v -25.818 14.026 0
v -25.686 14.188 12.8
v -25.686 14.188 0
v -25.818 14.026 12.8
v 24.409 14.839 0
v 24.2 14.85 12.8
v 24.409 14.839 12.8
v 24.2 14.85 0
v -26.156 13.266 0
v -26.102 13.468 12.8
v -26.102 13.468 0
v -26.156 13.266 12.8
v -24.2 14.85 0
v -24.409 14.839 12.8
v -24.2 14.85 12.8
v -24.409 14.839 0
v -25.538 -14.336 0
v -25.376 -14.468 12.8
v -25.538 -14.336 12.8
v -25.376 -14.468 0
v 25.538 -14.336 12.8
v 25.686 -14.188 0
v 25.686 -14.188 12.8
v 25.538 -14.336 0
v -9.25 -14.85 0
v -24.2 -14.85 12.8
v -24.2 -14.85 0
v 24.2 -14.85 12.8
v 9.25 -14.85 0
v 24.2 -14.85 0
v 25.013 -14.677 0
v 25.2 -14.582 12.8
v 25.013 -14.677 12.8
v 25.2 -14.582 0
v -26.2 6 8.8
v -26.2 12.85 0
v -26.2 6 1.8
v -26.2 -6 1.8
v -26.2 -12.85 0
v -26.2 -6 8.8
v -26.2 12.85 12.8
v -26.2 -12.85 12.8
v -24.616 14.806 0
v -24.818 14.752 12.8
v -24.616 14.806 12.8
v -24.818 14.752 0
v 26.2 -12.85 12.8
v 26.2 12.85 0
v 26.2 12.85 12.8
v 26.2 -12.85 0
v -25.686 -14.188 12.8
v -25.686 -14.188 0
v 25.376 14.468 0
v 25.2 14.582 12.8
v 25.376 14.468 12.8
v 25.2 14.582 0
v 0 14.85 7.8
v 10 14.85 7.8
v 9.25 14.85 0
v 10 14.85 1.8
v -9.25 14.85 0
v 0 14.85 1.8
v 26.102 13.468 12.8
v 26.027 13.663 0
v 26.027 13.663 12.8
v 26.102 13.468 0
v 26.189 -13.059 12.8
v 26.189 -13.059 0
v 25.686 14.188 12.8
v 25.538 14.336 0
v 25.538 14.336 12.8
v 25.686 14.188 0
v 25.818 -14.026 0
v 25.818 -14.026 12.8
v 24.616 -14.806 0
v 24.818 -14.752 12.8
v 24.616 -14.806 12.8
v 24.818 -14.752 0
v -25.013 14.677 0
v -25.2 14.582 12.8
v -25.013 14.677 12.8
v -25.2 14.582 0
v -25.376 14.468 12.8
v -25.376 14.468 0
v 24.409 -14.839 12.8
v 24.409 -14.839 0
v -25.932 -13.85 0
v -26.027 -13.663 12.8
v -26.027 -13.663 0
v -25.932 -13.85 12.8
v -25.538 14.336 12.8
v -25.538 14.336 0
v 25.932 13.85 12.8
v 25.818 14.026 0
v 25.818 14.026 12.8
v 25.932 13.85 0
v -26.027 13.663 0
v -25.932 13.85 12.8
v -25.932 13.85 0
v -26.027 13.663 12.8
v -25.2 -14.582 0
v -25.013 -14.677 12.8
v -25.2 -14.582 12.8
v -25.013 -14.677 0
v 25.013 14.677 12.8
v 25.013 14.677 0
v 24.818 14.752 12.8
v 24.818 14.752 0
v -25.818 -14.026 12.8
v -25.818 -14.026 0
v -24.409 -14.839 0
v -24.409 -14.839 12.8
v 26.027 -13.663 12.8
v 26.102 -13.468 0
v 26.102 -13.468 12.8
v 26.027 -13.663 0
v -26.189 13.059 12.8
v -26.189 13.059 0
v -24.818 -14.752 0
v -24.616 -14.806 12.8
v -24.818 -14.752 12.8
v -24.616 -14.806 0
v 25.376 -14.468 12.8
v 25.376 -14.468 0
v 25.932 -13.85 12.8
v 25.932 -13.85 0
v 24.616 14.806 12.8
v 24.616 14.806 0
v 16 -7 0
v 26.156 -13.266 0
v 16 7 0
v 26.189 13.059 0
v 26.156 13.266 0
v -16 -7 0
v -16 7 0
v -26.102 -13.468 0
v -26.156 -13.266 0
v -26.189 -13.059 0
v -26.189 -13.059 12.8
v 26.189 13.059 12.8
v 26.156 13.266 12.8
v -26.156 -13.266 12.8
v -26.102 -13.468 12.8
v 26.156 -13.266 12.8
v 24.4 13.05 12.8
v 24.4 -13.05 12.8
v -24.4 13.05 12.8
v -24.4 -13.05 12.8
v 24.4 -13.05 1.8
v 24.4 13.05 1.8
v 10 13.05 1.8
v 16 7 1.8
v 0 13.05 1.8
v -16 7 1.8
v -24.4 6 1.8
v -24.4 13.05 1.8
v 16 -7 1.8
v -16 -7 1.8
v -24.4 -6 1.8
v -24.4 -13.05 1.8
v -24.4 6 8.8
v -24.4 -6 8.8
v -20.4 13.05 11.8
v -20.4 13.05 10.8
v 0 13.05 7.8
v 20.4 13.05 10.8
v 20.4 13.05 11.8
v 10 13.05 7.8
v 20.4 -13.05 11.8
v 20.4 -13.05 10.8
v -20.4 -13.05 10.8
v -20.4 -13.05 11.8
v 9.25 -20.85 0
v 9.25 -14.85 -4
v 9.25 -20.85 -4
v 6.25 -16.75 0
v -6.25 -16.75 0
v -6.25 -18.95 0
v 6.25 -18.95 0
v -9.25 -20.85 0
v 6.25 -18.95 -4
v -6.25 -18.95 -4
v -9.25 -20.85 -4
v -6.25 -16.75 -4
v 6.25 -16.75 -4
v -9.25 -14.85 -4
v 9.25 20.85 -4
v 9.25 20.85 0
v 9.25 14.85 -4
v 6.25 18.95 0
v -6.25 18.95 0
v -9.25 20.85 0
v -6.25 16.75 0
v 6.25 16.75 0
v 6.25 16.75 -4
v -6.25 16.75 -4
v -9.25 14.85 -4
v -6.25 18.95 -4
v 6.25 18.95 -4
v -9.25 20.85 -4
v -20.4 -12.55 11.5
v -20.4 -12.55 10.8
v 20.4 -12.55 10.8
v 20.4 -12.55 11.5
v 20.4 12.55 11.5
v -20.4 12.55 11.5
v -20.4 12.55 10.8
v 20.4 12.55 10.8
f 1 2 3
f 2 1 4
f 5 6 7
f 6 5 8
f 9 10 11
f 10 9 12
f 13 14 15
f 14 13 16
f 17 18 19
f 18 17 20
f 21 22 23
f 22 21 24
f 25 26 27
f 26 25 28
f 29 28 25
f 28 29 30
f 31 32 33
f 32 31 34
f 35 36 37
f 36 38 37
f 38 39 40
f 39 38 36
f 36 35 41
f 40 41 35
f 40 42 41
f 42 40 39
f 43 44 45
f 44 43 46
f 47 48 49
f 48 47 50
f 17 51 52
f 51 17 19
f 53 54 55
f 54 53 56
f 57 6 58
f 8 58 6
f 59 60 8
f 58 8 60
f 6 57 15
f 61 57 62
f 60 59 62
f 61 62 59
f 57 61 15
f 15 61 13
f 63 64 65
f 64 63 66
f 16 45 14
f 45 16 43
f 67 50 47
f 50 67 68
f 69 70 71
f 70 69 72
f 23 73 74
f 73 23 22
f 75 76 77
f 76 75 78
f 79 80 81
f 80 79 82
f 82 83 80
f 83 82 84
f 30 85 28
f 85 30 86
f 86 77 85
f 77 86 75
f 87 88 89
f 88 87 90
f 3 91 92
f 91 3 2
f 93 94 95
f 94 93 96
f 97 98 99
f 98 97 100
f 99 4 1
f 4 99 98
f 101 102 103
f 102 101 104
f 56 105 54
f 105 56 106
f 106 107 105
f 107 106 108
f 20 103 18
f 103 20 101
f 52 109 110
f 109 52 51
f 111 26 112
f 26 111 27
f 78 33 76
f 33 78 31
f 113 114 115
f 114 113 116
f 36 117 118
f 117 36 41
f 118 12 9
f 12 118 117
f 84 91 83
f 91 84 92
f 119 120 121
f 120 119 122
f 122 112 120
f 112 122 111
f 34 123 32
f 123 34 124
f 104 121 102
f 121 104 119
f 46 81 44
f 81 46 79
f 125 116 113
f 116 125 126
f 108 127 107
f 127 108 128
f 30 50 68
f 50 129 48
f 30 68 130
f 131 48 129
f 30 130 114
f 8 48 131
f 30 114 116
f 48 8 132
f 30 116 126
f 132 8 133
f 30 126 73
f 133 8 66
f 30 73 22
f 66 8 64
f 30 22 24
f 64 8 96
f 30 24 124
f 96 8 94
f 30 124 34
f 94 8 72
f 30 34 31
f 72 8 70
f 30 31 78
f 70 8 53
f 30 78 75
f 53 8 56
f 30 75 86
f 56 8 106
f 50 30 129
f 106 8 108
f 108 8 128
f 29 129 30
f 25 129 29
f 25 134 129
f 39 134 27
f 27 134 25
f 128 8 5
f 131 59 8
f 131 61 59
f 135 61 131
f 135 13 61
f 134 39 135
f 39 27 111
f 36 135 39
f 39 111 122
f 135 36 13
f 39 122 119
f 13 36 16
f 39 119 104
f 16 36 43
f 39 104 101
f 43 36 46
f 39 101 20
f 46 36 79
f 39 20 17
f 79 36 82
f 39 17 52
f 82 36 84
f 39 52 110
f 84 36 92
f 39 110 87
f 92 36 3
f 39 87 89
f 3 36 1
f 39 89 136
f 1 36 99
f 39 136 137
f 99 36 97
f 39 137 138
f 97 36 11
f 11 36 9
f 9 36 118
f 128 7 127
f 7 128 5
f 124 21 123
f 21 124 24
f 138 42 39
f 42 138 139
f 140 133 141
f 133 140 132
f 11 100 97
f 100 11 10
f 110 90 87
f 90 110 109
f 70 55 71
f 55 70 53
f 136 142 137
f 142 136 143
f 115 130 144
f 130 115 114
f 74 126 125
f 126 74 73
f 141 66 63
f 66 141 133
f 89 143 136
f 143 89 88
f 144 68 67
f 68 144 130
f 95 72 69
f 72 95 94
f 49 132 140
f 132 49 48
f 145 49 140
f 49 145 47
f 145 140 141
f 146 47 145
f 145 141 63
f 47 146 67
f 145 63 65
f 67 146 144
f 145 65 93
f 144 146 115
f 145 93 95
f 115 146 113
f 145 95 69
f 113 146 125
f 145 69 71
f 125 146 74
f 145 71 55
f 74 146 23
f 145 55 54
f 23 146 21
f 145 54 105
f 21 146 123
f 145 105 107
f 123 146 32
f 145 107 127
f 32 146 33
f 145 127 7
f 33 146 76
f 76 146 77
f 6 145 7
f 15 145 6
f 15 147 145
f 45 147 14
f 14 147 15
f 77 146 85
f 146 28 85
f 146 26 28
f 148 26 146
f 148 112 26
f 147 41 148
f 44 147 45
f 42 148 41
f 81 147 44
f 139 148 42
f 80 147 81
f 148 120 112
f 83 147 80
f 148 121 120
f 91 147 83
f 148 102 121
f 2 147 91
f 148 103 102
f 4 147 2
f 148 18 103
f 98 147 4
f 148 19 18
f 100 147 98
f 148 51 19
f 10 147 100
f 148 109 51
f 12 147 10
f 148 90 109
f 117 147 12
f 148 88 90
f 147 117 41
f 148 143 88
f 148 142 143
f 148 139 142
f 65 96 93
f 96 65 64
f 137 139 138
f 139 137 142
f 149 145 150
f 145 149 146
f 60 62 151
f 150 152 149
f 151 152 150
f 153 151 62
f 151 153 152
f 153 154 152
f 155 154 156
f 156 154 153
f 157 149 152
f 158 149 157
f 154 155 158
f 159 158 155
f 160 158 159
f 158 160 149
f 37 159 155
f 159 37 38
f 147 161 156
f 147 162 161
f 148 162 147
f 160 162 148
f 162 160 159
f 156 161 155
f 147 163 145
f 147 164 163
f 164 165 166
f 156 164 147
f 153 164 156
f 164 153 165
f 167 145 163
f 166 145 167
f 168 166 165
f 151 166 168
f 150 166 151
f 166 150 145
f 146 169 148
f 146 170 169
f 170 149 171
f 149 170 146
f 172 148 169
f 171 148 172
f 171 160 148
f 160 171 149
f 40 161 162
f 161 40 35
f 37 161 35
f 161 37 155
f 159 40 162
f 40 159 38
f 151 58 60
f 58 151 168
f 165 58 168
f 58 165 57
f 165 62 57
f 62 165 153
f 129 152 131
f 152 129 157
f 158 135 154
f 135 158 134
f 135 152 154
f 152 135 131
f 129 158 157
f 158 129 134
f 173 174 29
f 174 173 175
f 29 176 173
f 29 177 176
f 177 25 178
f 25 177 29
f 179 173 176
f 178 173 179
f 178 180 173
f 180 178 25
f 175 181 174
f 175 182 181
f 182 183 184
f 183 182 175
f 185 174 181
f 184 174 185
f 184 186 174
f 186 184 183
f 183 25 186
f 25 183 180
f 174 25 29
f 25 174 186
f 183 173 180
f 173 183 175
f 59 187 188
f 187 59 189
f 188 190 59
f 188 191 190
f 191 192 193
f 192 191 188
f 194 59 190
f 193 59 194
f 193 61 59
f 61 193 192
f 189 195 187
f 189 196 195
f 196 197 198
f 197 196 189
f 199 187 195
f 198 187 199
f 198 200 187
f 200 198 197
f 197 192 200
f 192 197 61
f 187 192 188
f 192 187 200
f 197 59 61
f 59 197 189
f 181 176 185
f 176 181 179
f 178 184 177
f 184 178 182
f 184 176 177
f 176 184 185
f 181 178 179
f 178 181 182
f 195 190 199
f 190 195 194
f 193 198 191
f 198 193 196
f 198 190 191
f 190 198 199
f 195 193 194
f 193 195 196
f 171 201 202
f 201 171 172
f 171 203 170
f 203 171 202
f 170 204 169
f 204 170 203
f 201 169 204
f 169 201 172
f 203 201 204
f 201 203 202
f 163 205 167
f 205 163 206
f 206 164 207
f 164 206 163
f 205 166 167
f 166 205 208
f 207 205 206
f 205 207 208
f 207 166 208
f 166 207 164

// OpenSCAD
// =============================================================================
// CogniLink Assistive Technology - Primary Finger Ring Cradle (Standalone)
// =============================================================================
// Dedicated parametric OpenSCAD model for the primary dorsal finger ring mount.
// Designed for anatomical placement on the proximal phalanx of index/middle finger.
//
// Printing: PETG, 0.20mm layer height, 100% infill, oriented with base on bed.
// =============================================================================

/* [Finger Ring Parameters] */
// Proximal phalanx inner diameter (mm) - standard adult index/middle finger = 19-23mm
FINGER_INNER_DIAMETER = 21.0;

// Internal clearance for M5StickC snap fit (mm)
TOLERANCE = 0.30;

// Ring strap cinch width (mm) - standard silicone strap = 12mm
STRAP_WIDTH = 12.0;

// Resolution
$fn = 60;

// Dimensions
MODULE_LENGTH = 48.2;
MODULE_WIDTH  = 25.5;
WALL_THICKNESS = 1.8;
BASE_THICKNESS = 1.8;
POCKET_DEPTH = 11.0;
SNAP_LIP_DEPTH = 0.50;

cav_l = MODULE_LENGTH + 2 * TOLERANCE;
cav_w = MODULE_WIDTH  + 2 * TOLERANCE;
out_l = cav_l + 2 * WALL_THICKNESS;
out_w = cav_w + 2 * WALL_THICKNESS;
tot_h = BASE_THICKNESS + POCKET_DEPTH;

module finger_ring_cradle() {
    difference() {
        // Outer body with rounded corners
        hull() {
            r_c = 2.0;
            translate([-out_l/2 + r_c, -out_w/2 + r_c, 0]) cylinder(r=r_c, h=tot_h);
            translate([ out_l/2 - r_c, -out_w/2 + r_c, 0]) cylinder(r=r_c, h=tot_h);
            translate([-out_l/2 + r_c,  out_w/2 - r_c, 0]) cylinder(r=r_c, h=tot_h);
            translate([ out_l/2 - r_c,  out_w/2 - r_c, 0]) cylinder(r=r_c, h=tot_h);
        }

        // Inner cavity
        translate([-cav_l/2, -cav_w/2, BASE_THICKNESS])
            cube([cav_l, cav_w, POCKET_DEPTH + 1.0]);

        // USB-C port cutout (-X face)
        translate([-out_l/2 - 0.5, -6.0, BASE_THICKNESS])
            cube([WALL_THICKNESS + 1.0, 12.0, 7.0]);

        // Button B (Reset) cutout (+Y face)
        translate([0.0, cav_w/2 - 0.5, BASE_THICKNESS])
            cube([10.0, WALL_THICKNESS + 1.0, 6.0]);

        // Floor ventilation slot
        translate([-16.0, -7.0, -0.5])
            cube([32.0, 14.0, BASE_THICKNESS + 1.0]);
    }

    // Top snap-fit retention lips (+/- Y)
    translate([-cav_l/2 + 4.0, -cav_w/2, tot_h - 1.0])
        rotate([0, 90, 0])
        linear_extrude(cav_l - 8.0)
        polygon(points=[[0, 0], [1.0, 0], [1.0, SNAP_LIP_DEPTH], [0.3, SNAP_LIP_DEPTH]]);

    translate([-cav_l/2 + 4.0, cav_w/2, tot_h - 1.0])
        rotate([0, 90, 0])
        linear_extrude(cav_l - 8.0)
        polygon(points=[[0, 0], [1.0, 0], [1.0, -SNAP_LIP_DEPTH], [0.3, -SNAP_LIP_DEPTH]]);

    // Anatomical dorsal curved saddle
    r_in = FINGER_INNER_DIAMETER / 2.0;
    th = 2.2;
    r_out = r_in + th;

    difference() {
        translate([-out_l/2, 0, 0])
            rotate([0, 90, 0])
            cylinder(r=r_out, h=out_l);

        translate([-out_l/2 - 1, 0, 0])
            rotate([0, 90, 0])
            cylinder(r=r_in, h=out_l + 2);

        translate([-out_l/2 - 1, -r_out - 1, -2*r_out])
            cube([out_l + 2, 2*r_out + 2, 2*r_out]);

        translate([-out_l/2 - 1, -r_out - 1, 0.01])
            cube([out_l + 2, 2*r_out + 2, r_out]);
    }

    // Lateral ring cinch loops (+/- Y)
    loop_w = 6.0;
    slot_l = STRAP_WIDTH + 0.5;
    slot_th = 2.2;

    difference() {
        union() {
            translate([-slot_l/2 - 3, -out_w/2 - loop_w, -4.0]) cube([slot_l + 6, loop_w, 4.0]);
            translate([-slot_l/2 - 3,  out_w/2,          -4.0]) cube([slot_l + 6, loop_w, 4.0]);
        }
        translate([-slot_l/2, -out_w/2 - loop_w/2 - slot_th/2, -4.5]) cube([slot_l, slot_th, 5.0]);
        translate([-slot_l/2,  out_w/2 + loop_w/2 - slot_th/2, -4.5]) cube([slot_l, slot_th, 5.0]);
    }
}

// Render model
color([0.2, 0.7, 0.9])
    finger_ring_cradle();
